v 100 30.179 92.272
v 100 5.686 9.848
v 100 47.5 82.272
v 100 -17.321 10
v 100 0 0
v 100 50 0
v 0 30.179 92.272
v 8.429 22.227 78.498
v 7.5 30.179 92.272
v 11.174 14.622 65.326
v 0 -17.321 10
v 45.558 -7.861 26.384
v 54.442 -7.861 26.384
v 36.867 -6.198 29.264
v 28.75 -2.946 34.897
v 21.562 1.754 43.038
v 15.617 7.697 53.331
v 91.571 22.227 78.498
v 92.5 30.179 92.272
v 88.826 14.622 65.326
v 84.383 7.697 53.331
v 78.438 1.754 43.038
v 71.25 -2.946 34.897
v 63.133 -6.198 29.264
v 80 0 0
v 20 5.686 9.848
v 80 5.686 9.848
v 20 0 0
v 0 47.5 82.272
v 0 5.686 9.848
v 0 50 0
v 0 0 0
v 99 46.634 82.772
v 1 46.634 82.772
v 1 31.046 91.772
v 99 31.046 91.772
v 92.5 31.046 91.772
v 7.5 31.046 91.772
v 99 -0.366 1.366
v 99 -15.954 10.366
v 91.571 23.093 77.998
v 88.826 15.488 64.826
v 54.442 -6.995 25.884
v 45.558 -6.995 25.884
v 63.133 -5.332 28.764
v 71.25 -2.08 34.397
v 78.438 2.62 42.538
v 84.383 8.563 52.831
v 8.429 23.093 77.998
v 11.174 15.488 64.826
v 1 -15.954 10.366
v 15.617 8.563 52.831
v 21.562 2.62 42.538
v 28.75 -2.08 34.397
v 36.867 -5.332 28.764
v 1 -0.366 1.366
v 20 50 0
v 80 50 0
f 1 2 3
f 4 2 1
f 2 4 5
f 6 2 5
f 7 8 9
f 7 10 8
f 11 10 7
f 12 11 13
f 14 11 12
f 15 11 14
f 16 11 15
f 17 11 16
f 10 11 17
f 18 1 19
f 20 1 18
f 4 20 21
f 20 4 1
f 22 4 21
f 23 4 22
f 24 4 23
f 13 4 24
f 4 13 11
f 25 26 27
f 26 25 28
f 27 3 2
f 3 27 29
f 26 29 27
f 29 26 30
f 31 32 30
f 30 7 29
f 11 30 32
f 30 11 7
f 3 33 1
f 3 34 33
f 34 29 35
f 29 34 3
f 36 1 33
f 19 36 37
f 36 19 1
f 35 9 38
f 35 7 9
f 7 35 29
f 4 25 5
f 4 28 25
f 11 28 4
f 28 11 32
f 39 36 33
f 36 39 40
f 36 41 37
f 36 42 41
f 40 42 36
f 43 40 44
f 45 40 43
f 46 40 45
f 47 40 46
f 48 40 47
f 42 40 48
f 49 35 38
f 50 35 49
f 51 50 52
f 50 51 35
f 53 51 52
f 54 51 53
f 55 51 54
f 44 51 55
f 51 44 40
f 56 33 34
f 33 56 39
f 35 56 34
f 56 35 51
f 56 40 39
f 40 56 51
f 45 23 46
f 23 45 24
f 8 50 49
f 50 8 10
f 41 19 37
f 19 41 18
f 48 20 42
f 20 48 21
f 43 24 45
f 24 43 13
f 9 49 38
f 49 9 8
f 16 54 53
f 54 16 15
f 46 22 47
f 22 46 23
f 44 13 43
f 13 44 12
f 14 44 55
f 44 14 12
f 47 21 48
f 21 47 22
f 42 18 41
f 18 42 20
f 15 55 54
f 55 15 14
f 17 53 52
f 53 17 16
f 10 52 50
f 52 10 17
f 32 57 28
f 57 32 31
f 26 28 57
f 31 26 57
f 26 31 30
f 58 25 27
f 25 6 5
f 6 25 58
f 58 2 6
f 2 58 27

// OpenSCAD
// sticker holder

rotate([60,0,0]) {
    difference() {
        cube([100,95,20]);
        translate([1,1,1]) cube([98,99,18]);
        translate([50,95,19]) scale([1,1.8,1]) cylinder(d=85,h=3);
    }
}
rotate([90,0,0]) rotate([0,90,0]) linear_extrude(20) polygon([ [0,0], [50,0], [5,10] ]);

translate([80,0,0]) rotate([90,0,0]) rotate([0,90,0]) linear_extrude(20) polygon([ [0,0], [50,0], [5,10] ]);
